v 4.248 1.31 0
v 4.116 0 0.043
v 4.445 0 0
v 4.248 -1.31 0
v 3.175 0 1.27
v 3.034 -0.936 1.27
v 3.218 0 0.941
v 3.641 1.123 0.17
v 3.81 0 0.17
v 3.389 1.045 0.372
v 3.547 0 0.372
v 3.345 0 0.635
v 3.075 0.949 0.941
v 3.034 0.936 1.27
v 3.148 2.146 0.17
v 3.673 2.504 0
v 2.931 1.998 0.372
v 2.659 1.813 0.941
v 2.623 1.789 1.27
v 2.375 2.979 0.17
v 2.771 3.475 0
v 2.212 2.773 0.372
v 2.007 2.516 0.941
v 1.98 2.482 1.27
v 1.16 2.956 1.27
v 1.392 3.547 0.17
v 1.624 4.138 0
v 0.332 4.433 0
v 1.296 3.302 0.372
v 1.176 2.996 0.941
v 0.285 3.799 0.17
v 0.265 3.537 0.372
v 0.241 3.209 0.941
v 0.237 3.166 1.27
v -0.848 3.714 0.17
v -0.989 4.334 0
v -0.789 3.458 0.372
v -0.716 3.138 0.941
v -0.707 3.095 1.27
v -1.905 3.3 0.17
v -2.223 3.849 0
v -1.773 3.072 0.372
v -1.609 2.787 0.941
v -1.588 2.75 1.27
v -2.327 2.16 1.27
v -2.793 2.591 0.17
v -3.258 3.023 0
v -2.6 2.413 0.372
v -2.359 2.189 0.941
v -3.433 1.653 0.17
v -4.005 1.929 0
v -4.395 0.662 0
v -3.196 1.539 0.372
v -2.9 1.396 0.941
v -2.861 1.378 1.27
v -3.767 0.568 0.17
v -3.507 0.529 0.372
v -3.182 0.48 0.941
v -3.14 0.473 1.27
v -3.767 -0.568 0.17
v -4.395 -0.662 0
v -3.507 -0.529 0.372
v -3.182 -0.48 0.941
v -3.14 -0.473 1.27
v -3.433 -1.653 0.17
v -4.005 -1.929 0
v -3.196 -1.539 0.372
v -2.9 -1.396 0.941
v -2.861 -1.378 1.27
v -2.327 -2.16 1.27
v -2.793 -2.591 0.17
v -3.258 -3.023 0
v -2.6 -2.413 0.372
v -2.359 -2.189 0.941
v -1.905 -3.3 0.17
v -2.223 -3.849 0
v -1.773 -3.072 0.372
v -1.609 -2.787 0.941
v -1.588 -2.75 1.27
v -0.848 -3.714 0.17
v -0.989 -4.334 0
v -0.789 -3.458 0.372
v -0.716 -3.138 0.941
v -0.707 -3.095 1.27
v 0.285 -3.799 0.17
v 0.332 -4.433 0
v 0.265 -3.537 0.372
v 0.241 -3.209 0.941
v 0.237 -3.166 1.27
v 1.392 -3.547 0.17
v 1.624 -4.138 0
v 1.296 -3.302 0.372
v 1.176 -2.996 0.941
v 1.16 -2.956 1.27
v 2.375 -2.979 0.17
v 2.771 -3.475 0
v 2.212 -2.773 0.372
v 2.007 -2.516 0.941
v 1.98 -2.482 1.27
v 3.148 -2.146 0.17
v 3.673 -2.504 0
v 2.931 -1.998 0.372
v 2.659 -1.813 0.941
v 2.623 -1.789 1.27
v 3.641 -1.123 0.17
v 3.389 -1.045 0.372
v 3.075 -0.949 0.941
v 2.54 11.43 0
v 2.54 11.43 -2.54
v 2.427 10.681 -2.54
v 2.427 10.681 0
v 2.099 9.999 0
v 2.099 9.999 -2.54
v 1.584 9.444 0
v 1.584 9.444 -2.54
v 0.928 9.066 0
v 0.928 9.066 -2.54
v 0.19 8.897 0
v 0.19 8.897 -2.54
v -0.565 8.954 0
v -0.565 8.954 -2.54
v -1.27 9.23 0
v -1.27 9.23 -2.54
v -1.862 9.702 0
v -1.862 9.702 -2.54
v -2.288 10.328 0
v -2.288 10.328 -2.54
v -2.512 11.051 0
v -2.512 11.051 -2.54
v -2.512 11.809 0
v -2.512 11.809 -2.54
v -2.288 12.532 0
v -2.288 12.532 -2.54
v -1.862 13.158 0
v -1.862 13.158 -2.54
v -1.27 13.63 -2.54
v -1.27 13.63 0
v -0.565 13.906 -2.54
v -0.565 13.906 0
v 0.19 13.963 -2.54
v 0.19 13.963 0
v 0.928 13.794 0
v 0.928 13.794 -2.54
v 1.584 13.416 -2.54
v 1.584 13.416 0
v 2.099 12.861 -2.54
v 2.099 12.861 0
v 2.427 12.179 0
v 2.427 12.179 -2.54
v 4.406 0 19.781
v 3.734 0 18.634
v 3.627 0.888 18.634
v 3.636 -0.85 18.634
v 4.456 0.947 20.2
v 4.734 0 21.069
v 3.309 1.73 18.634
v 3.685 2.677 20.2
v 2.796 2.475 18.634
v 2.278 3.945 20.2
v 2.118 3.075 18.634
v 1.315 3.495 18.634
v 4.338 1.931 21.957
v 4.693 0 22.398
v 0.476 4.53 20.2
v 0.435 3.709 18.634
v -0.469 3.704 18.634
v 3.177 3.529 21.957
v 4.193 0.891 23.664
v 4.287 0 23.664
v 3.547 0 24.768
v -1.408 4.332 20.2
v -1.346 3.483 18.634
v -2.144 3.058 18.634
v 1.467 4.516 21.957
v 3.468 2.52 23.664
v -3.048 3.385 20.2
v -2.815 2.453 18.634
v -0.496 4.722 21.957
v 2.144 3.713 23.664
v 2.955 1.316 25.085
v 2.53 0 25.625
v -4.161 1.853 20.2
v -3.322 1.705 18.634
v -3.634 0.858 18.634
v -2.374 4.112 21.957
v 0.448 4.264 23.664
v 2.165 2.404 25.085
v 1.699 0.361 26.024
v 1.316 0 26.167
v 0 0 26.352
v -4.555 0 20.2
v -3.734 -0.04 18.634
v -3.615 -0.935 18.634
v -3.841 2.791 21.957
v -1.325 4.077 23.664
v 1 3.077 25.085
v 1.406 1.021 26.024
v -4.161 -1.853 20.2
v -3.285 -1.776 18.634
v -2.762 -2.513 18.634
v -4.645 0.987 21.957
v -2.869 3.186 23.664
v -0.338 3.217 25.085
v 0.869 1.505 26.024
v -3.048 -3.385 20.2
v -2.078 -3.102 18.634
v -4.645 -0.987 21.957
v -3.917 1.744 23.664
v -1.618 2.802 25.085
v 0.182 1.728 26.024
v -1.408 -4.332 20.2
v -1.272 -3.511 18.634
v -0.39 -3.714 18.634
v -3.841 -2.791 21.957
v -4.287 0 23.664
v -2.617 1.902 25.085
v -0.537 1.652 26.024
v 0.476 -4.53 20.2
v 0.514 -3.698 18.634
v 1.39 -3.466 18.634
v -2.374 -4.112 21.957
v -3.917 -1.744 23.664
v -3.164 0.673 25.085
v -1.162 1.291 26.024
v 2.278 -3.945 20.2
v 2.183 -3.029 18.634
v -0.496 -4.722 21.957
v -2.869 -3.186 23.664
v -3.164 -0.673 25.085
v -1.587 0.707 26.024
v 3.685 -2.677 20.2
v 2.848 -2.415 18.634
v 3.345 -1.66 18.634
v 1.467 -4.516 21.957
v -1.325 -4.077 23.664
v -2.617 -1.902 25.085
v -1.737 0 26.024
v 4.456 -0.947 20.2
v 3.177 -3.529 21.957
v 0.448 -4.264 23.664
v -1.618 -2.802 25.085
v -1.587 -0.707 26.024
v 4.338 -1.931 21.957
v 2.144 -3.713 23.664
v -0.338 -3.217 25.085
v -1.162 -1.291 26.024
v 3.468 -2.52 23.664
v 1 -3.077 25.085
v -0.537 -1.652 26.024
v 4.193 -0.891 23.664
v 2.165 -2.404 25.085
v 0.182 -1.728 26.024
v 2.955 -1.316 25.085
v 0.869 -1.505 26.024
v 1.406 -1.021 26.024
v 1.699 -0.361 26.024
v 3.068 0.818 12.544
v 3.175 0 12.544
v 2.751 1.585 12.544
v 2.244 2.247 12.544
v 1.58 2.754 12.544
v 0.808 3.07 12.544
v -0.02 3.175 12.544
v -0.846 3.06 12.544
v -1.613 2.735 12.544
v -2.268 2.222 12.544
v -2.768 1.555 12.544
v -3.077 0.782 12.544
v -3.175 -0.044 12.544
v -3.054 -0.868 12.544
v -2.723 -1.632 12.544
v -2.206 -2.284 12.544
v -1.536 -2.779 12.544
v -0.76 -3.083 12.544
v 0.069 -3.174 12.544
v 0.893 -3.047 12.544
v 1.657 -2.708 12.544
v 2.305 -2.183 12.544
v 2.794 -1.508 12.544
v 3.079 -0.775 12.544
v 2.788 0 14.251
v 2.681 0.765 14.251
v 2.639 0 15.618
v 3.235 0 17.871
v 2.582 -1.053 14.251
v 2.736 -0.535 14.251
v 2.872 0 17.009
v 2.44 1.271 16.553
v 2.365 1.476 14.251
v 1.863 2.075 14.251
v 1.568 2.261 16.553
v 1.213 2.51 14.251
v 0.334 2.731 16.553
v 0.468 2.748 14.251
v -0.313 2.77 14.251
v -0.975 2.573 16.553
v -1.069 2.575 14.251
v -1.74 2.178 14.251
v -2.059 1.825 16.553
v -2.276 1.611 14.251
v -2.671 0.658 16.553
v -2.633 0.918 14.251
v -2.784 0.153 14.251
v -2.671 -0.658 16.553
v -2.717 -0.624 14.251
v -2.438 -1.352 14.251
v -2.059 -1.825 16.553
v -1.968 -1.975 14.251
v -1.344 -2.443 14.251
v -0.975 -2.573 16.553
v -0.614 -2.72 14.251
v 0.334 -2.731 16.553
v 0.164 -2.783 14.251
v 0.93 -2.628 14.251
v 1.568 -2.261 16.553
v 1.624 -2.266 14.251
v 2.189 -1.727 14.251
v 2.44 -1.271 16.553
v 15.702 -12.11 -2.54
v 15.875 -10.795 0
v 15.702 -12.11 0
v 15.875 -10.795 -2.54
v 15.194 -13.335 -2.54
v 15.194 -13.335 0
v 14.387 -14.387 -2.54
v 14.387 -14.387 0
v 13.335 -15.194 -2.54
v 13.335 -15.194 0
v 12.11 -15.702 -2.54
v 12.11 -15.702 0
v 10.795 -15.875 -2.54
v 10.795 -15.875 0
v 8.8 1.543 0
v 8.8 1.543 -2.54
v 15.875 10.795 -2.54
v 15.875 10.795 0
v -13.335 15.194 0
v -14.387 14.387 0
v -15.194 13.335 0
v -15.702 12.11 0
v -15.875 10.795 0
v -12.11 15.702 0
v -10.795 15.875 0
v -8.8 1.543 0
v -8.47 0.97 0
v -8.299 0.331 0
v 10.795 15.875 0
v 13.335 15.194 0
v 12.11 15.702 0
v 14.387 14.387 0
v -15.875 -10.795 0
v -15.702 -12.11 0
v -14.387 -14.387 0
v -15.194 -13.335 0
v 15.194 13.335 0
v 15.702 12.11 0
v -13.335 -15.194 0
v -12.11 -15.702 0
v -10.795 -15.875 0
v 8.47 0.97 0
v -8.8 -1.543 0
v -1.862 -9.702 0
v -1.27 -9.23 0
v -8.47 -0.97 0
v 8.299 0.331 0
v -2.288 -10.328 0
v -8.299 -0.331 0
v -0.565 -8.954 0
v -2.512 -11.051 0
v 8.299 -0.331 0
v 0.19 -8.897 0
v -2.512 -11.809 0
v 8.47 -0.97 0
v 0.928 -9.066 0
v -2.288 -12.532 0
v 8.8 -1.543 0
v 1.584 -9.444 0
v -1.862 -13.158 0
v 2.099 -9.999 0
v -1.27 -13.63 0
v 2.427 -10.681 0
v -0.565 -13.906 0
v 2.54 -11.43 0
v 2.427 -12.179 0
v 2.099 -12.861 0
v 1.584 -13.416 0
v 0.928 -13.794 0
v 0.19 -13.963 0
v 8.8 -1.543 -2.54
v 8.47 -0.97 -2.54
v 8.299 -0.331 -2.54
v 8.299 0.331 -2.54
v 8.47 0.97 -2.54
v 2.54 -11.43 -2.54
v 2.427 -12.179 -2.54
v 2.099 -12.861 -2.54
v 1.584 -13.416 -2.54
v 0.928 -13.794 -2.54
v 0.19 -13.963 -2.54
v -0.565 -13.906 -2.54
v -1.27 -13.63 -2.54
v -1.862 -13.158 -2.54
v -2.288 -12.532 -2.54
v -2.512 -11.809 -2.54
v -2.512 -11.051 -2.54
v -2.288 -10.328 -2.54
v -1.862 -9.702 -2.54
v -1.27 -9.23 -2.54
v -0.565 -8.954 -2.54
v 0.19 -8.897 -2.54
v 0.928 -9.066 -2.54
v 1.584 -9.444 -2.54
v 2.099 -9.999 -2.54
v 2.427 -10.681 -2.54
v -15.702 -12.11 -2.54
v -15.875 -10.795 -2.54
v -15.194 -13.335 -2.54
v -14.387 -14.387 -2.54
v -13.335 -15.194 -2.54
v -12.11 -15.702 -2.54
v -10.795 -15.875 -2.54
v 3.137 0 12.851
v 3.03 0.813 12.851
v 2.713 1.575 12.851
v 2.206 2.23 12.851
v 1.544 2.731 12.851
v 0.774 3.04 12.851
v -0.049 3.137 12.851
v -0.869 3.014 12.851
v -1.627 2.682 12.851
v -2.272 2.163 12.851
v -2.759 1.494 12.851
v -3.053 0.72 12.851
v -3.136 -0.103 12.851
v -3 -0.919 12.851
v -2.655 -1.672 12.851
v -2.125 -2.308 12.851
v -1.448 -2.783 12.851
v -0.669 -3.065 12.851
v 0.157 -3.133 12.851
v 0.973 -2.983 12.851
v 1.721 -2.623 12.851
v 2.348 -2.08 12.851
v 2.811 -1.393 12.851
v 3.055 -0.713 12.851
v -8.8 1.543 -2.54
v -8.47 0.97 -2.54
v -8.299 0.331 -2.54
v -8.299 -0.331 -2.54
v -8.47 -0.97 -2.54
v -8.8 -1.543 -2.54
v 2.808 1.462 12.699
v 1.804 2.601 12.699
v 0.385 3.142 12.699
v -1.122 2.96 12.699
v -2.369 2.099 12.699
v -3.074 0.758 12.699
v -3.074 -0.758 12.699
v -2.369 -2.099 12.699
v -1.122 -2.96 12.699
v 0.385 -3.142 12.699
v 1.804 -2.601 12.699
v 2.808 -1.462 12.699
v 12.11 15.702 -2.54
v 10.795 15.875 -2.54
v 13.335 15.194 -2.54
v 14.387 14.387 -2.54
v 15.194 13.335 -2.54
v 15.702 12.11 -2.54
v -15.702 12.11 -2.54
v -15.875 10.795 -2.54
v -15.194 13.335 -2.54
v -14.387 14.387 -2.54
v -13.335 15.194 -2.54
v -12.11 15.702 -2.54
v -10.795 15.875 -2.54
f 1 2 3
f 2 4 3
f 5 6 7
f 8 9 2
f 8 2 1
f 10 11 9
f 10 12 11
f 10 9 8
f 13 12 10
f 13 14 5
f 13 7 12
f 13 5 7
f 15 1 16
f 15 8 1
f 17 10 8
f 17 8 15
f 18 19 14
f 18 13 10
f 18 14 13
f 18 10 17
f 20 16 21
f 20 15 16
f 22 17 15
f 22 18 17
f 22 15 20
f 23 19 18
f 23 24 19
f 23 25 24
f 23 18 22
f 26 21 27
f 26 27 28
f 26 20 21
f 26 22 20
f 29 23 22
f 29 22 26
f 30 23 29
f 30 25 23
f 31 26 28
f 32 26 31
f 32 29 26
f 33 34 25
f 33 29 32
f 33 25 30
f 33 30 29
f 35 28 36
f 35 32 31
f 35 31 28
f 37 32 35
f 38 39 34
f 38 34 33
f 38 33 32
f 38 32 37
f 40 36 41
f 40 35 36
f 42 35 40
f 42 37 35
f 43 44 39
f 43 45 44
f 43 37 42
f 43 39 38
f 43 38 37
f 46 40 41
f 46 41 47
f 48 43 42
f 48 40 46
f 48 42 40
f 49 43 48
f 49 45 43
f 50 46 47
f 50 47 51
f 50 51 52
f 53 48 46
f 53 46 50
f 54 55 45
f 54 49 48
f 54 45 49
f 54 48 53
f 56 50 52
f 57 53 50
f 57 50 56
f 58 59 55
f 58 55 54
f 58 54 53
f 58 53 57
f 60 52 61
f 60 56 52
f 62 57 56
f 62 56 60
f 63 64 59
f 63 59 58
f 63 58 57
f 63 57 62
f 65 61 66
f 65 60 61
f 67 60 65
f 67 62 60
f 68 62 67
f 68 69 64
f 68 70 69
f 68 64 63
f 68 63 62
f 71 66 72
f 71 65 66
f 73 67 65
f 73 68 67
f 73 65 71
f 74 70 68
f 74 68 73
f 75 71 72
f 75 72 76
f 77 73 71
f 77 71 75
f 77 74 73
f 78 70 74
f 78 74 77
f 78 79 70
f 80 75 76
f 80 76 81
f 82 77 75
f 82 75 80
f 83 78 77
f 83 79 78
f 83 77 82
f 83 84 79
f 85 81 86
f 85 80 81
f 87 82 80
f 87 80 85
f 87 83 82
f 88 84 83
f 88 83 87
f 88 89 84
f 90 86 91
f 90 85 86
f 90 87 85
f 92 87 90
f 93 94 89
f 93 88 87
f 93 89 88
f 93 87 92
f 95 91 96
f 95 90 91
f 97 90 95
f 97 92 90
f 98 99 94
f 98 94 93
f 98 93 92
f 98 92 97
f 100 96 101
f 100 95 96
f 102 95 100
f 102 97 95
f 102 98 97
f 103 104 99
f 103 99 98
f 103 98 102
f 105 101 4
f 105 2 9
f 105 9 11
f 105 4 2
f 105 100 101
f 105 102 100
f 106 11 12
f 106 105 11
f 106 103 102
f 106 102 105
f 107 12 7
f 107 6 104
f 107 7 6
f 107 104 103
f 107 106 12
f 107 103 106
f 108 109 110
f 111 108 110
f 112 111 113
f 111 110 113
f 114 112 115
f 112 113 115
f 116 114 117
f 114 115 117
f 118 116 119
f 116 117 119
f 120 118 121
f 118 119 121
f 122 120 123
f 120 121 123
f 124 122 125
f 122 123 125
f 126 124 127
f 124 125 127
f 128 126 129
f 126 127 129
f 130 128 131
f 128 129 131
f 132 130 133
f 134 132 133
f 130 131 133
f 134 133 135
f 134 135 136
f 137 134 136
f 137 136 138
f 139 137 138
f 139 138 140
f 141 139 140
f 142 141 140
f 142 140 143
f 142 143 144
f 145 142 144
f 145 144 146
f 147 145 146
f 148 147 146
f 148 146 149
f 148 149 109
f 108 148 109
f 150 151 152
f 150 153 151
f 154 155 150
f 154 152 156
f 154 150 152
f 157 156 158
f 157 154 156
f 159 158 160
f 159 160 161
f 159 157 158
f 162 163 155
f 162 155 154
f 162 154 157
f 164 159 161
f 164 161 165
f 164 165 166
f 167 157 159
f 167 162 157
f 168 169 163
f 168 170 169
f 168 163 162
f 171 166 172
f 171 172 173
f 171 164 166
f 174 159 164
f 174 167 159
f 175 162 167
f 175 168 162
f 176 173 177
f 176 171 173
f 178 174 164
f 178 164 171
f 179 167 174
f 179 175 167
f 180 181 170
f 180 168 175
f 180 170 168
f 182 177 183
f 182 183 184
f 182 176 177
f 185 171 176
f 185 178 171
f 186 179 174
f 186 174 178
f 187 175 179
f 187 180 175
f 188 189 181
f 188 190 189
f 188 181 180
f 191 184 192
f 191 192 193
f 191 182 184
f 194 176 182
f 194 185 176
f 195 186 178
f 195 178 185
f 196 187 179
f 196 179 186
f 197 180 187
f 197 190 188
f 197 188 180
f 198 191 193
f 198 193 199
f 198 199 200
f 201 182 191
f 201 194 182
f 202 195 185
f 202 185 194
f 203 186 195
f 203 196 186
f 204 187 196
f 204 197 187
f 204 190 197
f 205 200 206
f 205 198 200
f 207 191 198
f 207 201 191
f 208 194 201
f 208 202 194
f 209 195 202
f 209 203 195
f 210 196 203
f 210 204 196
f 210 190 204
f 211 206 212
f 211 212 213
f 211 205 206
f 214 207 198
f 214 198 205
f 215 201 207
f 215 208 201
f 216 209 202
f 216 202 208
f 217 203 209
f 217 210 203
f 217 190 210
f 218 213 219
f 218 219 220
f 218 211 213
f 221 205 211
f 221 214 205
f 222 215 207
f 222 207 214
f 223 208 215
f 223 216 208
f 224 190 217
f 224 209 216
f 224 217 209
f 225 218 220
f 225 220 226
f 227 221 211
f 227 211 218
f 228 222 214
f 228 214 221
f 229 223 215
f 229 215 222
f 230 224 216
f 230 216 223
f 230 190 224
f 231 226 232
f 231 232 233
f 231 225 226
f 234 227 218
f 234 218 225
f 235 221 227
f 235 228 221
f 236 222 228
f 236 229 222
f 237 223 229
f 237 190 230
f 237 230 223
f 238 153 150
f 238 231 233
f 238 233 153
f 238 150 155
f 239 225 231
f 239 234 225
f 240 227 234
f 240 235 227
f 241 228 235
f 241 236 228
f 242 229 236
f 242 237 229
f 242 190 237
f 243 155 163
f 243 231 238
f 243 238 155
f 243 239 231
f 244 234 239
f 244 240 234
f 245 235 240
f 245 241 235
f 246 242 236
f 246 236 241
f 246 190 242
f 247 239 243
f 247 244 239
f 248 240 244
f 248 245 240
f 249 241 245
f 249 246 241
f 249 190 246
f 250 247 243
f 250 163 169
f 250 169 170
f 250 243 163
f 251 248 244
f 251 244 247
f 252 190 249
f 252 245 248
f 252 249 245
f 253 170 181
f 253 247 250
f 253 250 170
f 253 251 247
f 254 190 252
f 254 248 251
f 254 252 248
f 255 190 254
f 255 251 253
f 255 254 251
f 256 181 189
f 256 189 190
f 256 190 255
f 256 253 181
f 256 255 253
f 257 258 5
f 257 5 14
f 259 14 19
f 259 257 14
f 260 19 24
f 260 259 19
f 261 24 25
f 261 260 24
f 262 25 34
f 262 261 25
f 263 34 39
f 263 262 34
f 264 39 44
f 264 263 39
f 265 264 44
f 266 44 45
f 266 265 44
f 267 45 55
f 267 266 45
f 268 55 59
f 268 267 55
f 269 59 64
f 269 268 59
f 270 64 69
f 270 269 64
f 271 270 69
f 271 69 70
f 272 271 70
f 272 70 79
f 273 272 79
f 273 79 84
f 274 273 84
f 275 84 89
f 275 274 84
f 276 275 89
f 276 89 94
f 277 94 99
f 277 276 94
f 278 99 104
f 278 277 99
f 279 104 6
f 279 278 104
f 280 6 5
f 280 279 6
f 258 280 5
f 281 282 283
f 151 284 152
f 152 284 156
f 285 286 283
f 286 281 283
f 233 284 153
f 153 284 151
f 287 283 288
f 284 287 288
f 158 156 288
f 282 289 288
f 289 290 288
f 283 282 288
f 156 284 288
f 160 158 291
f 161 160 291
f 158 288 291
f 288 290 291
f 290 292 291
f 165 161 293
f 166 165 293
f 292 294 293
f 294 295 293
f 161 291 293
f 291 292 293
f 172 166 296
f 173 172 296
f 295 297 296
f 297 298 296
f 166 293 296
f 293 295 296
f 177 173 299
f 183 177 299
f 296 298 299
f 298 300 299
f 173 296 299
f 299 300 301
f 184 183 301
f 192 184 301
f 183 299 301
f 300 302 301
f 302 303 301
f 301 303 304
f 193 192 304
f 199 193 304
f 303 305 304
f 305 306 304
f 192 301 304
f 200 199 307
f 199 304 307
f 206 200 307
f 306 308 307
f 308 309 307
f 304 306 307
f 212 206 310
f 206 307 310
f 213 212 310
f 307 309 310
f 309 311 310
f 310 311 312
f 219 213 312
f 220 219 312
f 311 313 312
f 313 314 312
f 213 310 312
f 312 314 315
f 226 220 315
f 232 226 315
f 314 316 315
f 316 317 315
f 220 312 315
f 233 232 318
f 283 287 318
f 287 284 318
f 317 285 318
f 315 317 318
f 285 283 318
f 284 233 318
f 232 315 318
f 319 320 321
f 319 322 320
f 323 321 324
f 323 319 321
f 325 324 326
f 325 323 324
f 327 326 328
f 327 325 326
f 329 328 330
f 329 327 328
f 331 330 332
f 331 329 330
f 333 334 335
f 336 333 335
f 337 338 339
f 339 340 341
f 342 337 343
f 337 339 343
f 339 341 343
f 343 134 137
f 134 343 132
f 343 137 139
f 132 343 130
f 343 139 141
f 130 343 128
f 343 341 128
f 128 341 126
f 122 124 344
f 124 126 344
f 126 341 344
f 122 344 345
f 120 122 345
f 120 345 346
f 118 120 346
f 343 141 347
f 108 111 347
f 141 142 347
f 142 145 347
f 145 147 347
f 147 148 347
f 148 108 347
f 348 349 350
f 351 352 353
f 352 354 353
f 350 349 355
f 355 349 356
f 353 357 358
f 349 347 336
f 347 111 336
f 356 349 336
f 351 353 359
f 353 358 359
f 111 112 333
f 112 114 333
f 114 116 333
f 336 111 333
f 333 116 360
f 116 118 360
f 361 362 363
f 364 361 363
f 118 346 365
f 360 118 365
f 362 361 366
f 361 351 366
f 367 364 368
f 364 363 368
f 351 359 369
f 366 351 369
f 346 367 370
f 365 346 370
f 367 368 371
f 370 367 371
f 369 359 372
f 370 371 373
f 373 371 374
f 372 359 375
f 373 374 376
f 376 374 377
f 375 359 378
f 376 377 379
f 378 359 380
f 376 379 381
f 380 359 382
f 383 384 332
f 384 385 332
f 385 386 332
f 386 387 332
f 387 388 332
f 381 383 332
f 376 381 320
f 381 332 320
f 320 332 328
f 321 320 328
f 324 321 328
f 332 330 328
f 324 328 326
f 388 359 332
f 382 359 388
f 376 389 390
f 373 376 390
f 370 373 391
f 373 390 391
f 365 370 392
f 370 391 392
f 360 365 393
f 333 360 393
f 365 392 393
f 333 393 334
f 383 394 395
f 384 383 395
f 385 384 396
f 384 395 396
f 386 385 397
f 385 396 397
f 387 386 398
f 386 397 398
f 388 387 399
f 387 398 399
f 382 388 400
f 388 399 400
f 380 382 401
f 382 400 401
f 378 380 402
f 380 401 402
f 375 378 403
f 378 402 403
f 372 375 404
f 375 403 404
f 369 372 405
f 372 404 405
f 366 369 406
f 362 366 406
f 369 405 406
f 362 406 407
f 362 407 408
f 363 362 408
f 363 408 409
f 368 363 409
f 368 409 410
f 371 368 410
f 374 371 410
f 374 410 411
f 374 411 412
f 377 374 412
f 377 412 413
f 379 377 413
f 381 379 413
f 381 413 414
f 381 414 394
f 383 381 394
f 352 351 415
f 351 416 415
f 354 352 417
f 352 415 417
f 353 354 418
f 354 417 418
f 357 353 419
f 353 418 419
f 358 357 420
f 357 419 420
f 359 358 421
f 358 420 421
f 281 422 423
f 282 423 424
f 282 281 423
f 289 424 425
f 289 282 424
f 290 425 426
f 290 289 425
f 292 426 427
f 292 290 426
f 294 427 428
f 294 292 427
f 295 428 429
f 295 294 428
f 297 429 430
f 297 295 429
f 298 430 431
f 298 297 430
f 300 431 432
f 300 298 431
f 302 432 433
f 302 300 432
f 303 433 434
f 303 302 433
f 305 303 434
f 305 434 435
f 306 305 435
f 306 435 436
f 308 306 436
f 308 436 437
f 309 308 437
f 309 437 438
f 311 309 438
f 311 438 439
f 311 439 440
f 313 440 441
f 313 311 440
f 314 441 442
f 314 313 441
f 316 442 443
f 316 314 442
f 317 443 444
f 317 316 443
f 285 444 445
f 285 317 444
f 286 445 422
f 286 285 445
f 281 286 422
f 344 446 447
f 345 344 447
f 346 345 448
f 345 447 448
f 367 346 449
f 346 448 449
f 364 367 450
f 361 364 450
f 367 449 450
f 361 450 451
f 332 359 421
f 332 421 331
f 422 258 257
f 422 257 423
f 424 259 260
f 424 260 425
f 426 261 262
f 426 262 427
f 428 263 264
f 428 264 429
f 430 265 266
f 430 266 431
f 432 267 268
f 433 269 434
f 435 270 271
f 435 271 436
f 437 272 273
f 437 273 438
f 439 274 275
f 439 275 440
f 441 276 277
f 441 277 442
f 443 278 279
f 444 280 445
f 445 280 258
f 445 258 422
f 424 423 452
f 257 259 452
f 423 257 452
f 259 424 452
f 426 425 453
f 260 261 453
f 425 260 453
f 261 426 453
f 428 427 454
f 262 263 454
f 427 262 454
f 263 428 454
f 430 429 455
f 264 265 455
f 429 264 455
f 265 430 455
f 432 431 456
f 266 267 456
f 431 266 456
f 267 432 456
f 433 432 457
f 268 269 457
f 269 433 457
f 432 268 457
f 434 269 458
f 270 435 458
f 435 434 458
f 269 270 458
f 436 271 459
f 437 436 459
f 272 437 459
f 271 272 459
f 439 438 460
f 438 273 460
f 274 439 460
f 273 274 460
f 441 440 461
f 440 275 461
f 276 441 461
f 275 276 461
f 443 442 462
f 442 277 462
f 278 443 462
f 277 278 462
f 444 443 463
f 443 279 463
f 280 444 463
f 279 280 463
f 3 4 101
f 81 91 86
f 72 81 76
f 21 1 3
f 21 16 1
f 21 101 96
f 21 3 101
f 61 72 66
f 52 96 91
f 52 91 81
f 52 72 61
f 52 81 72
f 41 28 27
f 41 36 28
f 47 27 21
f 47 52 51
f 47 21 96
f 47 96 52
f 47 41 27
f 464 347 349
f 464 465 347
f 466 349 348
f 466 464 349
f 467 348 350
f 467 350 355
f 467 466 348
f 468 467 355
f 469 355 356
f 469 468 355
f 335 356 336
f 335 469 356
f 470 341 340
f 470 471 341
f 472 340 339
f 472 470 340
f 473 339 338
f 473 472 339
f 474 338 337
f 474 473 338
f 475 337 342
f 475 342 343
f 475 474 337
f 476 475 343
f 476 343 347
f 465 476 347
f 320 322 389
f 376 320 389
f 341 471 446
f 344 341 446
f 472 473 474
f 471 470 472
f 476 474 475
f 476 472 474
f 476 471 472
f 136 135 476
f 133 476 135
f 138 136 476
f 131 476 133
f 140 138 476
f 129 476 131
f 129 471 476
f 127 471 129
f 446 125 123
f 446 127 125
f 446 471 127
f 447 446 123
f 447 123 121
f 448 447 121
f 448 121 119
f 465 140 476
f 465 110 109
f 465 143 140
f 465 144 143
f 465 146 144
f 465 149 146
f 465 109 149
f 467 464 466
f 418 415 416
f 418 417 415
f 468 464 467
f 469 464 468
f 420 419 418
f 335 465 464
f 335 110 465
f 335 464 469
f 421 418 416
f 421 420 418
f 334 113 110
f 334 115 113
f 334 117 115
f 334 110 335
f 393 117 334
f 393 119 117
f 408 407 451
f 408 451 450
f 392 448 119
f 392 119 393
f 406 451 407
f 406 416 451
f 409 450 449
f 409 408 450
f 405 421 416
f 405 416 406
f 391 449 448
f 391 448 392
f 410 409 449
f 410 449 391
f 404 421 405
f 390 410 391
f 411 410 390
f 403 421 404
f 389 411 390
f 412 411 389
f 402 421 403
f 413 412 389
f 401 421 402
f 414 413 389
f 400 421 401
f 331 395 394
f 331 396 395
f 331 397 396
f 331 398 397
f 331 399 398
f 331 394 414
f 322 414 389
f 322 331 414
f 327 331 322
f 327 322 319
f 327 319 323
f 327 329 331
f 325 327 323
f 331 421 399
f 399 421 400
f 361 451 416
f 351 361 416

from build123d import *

# Parameters (mm, degrees)
F2_W     = 31.75
F2_H     = 31.75
F2_R     = 4.445
F3_DEPTH = 2.54
F4_R     = 5.08
F5_R     = 2.54
F6_DEPTH = 28.8935
F7_R     = 1.27
F9_DEPTH = 28.8935
F10_R    = 5.08


with BuildPart() as f1:
    # F0 (on Front) → F1 (revolve)
    with BuildSketch(Plane.XZ):
        with BuildLine():
            Line((0, 12.7), (0, 0))
            Line((0, 0), (3.175, 0))
            Line((3.175, 0), (4.445, 0))
            ThreePointArc((4.445, 0), (3.5469743879, 0.3719743879), (3.175, 1.27))
            Line((3.175, 1.27), (3.175, 12.7))
            Line((3.175, 12.7), (2.032, 17.2827523579))
            ThreePointArc((2.032, 17.2827523579), (4.6472934675, 22.6311866679), (0, 26.3525))
            Line((0, 26.3525), (0, 16.8275))
            Line((0, 16.8275), (0, 12.7))
        make_face()
    revolve(axis=Axis((0, 0, 21.59), (0, 0, 1)))

    # F7
    f7_edges = [f1.edges().sort_by_distance(p)[0] for p in [
        (-3.175, 0, 12.7),
    ]]
    fillet(f7_edges, radius=F7_R)

    # F10
    f10_edges = [f1.edges().sort_by_distance(p)[0] for p in [
        (-2.032, 0, 17.282752),
    ]]
    fillet(f10_edges, radius=F10_R)


with BuildPart() as f3:
    # F2 (on face) → F3 (new body)
    with BuildSketch(Plane(origin=(0, 0, 0), x_dir=(1, 0, 0), z_dir=(0, 0, -1))):
        Rectangle(F2_W, F2_H)
        Circle(F2_R, mode=Mode.SUBTRACT)
        Circle(F2_R)
    extrude(amount=F3_DEPTH)

    # F4
    f4_edges = [f3.edges().sort_by_distance(p)[0] for p in [
        (-15.875, -15.875, -1.27),
        (15.875, -15.875, -1.27),
        (15.875, 15.875, -1.27),
        (-15.875, 15.875, -1.27),
    ]]
    fillet(f4_edges, radius=F4_R)

    # F5 (on face) → F6 (cut, through all)
    with BuildSketch(Plane(origin=(0, 0, -2.54), x_dir=(1, 0, 0), z_dir=(0, 0, -1))):
        with Locations((0, 11.43)):
            Circle(F5_R)
        with Locations((0, -11.43)):
            Circle(F5_R)
    extrude(amount=-F6_DEPTH, mode=Mode.SUBTRACT)

    # F8 (on face) → F9 (cut, through all)
    with BuildSketch(Plane(origin=(0, 0, -2.54), x_dir=(1, 0, 0), z_dir=(0, 0, -1))):
        with BuildLine():
            Line((-8.7998825031, 1.5429232732), (-15.875, 10.795))
            Line((-15.875, 10.795), (-15.875, -10.795))
            Line((-15.875, -10.795), (-8.7998825031, -1.5429232732))
            ThreePointArc((-8.7998825031, -1.5429232732), (-8.2775513988, 0), (-8.7998825031, 1.5429232732))
        make_face()
        with BuildLine():
            Line((15.875, -10.795), (15.875, 10.795))
            Line((15.875, 10.795), (8.7998825031, 1.5429232732))
            ThreePointArc((8.7998825031, 1.5429232732), (8.2775513988, 0), (8.7998825031, -1.5429232732))
            Line((8.7998825031, -1.5429232732), (15.875, -10.795))
        make_face()
    extrude(amount=-F9_DEPTH, mode=Mode.SUBTRACT)


solid = Compound([f1.part, f3.part])
